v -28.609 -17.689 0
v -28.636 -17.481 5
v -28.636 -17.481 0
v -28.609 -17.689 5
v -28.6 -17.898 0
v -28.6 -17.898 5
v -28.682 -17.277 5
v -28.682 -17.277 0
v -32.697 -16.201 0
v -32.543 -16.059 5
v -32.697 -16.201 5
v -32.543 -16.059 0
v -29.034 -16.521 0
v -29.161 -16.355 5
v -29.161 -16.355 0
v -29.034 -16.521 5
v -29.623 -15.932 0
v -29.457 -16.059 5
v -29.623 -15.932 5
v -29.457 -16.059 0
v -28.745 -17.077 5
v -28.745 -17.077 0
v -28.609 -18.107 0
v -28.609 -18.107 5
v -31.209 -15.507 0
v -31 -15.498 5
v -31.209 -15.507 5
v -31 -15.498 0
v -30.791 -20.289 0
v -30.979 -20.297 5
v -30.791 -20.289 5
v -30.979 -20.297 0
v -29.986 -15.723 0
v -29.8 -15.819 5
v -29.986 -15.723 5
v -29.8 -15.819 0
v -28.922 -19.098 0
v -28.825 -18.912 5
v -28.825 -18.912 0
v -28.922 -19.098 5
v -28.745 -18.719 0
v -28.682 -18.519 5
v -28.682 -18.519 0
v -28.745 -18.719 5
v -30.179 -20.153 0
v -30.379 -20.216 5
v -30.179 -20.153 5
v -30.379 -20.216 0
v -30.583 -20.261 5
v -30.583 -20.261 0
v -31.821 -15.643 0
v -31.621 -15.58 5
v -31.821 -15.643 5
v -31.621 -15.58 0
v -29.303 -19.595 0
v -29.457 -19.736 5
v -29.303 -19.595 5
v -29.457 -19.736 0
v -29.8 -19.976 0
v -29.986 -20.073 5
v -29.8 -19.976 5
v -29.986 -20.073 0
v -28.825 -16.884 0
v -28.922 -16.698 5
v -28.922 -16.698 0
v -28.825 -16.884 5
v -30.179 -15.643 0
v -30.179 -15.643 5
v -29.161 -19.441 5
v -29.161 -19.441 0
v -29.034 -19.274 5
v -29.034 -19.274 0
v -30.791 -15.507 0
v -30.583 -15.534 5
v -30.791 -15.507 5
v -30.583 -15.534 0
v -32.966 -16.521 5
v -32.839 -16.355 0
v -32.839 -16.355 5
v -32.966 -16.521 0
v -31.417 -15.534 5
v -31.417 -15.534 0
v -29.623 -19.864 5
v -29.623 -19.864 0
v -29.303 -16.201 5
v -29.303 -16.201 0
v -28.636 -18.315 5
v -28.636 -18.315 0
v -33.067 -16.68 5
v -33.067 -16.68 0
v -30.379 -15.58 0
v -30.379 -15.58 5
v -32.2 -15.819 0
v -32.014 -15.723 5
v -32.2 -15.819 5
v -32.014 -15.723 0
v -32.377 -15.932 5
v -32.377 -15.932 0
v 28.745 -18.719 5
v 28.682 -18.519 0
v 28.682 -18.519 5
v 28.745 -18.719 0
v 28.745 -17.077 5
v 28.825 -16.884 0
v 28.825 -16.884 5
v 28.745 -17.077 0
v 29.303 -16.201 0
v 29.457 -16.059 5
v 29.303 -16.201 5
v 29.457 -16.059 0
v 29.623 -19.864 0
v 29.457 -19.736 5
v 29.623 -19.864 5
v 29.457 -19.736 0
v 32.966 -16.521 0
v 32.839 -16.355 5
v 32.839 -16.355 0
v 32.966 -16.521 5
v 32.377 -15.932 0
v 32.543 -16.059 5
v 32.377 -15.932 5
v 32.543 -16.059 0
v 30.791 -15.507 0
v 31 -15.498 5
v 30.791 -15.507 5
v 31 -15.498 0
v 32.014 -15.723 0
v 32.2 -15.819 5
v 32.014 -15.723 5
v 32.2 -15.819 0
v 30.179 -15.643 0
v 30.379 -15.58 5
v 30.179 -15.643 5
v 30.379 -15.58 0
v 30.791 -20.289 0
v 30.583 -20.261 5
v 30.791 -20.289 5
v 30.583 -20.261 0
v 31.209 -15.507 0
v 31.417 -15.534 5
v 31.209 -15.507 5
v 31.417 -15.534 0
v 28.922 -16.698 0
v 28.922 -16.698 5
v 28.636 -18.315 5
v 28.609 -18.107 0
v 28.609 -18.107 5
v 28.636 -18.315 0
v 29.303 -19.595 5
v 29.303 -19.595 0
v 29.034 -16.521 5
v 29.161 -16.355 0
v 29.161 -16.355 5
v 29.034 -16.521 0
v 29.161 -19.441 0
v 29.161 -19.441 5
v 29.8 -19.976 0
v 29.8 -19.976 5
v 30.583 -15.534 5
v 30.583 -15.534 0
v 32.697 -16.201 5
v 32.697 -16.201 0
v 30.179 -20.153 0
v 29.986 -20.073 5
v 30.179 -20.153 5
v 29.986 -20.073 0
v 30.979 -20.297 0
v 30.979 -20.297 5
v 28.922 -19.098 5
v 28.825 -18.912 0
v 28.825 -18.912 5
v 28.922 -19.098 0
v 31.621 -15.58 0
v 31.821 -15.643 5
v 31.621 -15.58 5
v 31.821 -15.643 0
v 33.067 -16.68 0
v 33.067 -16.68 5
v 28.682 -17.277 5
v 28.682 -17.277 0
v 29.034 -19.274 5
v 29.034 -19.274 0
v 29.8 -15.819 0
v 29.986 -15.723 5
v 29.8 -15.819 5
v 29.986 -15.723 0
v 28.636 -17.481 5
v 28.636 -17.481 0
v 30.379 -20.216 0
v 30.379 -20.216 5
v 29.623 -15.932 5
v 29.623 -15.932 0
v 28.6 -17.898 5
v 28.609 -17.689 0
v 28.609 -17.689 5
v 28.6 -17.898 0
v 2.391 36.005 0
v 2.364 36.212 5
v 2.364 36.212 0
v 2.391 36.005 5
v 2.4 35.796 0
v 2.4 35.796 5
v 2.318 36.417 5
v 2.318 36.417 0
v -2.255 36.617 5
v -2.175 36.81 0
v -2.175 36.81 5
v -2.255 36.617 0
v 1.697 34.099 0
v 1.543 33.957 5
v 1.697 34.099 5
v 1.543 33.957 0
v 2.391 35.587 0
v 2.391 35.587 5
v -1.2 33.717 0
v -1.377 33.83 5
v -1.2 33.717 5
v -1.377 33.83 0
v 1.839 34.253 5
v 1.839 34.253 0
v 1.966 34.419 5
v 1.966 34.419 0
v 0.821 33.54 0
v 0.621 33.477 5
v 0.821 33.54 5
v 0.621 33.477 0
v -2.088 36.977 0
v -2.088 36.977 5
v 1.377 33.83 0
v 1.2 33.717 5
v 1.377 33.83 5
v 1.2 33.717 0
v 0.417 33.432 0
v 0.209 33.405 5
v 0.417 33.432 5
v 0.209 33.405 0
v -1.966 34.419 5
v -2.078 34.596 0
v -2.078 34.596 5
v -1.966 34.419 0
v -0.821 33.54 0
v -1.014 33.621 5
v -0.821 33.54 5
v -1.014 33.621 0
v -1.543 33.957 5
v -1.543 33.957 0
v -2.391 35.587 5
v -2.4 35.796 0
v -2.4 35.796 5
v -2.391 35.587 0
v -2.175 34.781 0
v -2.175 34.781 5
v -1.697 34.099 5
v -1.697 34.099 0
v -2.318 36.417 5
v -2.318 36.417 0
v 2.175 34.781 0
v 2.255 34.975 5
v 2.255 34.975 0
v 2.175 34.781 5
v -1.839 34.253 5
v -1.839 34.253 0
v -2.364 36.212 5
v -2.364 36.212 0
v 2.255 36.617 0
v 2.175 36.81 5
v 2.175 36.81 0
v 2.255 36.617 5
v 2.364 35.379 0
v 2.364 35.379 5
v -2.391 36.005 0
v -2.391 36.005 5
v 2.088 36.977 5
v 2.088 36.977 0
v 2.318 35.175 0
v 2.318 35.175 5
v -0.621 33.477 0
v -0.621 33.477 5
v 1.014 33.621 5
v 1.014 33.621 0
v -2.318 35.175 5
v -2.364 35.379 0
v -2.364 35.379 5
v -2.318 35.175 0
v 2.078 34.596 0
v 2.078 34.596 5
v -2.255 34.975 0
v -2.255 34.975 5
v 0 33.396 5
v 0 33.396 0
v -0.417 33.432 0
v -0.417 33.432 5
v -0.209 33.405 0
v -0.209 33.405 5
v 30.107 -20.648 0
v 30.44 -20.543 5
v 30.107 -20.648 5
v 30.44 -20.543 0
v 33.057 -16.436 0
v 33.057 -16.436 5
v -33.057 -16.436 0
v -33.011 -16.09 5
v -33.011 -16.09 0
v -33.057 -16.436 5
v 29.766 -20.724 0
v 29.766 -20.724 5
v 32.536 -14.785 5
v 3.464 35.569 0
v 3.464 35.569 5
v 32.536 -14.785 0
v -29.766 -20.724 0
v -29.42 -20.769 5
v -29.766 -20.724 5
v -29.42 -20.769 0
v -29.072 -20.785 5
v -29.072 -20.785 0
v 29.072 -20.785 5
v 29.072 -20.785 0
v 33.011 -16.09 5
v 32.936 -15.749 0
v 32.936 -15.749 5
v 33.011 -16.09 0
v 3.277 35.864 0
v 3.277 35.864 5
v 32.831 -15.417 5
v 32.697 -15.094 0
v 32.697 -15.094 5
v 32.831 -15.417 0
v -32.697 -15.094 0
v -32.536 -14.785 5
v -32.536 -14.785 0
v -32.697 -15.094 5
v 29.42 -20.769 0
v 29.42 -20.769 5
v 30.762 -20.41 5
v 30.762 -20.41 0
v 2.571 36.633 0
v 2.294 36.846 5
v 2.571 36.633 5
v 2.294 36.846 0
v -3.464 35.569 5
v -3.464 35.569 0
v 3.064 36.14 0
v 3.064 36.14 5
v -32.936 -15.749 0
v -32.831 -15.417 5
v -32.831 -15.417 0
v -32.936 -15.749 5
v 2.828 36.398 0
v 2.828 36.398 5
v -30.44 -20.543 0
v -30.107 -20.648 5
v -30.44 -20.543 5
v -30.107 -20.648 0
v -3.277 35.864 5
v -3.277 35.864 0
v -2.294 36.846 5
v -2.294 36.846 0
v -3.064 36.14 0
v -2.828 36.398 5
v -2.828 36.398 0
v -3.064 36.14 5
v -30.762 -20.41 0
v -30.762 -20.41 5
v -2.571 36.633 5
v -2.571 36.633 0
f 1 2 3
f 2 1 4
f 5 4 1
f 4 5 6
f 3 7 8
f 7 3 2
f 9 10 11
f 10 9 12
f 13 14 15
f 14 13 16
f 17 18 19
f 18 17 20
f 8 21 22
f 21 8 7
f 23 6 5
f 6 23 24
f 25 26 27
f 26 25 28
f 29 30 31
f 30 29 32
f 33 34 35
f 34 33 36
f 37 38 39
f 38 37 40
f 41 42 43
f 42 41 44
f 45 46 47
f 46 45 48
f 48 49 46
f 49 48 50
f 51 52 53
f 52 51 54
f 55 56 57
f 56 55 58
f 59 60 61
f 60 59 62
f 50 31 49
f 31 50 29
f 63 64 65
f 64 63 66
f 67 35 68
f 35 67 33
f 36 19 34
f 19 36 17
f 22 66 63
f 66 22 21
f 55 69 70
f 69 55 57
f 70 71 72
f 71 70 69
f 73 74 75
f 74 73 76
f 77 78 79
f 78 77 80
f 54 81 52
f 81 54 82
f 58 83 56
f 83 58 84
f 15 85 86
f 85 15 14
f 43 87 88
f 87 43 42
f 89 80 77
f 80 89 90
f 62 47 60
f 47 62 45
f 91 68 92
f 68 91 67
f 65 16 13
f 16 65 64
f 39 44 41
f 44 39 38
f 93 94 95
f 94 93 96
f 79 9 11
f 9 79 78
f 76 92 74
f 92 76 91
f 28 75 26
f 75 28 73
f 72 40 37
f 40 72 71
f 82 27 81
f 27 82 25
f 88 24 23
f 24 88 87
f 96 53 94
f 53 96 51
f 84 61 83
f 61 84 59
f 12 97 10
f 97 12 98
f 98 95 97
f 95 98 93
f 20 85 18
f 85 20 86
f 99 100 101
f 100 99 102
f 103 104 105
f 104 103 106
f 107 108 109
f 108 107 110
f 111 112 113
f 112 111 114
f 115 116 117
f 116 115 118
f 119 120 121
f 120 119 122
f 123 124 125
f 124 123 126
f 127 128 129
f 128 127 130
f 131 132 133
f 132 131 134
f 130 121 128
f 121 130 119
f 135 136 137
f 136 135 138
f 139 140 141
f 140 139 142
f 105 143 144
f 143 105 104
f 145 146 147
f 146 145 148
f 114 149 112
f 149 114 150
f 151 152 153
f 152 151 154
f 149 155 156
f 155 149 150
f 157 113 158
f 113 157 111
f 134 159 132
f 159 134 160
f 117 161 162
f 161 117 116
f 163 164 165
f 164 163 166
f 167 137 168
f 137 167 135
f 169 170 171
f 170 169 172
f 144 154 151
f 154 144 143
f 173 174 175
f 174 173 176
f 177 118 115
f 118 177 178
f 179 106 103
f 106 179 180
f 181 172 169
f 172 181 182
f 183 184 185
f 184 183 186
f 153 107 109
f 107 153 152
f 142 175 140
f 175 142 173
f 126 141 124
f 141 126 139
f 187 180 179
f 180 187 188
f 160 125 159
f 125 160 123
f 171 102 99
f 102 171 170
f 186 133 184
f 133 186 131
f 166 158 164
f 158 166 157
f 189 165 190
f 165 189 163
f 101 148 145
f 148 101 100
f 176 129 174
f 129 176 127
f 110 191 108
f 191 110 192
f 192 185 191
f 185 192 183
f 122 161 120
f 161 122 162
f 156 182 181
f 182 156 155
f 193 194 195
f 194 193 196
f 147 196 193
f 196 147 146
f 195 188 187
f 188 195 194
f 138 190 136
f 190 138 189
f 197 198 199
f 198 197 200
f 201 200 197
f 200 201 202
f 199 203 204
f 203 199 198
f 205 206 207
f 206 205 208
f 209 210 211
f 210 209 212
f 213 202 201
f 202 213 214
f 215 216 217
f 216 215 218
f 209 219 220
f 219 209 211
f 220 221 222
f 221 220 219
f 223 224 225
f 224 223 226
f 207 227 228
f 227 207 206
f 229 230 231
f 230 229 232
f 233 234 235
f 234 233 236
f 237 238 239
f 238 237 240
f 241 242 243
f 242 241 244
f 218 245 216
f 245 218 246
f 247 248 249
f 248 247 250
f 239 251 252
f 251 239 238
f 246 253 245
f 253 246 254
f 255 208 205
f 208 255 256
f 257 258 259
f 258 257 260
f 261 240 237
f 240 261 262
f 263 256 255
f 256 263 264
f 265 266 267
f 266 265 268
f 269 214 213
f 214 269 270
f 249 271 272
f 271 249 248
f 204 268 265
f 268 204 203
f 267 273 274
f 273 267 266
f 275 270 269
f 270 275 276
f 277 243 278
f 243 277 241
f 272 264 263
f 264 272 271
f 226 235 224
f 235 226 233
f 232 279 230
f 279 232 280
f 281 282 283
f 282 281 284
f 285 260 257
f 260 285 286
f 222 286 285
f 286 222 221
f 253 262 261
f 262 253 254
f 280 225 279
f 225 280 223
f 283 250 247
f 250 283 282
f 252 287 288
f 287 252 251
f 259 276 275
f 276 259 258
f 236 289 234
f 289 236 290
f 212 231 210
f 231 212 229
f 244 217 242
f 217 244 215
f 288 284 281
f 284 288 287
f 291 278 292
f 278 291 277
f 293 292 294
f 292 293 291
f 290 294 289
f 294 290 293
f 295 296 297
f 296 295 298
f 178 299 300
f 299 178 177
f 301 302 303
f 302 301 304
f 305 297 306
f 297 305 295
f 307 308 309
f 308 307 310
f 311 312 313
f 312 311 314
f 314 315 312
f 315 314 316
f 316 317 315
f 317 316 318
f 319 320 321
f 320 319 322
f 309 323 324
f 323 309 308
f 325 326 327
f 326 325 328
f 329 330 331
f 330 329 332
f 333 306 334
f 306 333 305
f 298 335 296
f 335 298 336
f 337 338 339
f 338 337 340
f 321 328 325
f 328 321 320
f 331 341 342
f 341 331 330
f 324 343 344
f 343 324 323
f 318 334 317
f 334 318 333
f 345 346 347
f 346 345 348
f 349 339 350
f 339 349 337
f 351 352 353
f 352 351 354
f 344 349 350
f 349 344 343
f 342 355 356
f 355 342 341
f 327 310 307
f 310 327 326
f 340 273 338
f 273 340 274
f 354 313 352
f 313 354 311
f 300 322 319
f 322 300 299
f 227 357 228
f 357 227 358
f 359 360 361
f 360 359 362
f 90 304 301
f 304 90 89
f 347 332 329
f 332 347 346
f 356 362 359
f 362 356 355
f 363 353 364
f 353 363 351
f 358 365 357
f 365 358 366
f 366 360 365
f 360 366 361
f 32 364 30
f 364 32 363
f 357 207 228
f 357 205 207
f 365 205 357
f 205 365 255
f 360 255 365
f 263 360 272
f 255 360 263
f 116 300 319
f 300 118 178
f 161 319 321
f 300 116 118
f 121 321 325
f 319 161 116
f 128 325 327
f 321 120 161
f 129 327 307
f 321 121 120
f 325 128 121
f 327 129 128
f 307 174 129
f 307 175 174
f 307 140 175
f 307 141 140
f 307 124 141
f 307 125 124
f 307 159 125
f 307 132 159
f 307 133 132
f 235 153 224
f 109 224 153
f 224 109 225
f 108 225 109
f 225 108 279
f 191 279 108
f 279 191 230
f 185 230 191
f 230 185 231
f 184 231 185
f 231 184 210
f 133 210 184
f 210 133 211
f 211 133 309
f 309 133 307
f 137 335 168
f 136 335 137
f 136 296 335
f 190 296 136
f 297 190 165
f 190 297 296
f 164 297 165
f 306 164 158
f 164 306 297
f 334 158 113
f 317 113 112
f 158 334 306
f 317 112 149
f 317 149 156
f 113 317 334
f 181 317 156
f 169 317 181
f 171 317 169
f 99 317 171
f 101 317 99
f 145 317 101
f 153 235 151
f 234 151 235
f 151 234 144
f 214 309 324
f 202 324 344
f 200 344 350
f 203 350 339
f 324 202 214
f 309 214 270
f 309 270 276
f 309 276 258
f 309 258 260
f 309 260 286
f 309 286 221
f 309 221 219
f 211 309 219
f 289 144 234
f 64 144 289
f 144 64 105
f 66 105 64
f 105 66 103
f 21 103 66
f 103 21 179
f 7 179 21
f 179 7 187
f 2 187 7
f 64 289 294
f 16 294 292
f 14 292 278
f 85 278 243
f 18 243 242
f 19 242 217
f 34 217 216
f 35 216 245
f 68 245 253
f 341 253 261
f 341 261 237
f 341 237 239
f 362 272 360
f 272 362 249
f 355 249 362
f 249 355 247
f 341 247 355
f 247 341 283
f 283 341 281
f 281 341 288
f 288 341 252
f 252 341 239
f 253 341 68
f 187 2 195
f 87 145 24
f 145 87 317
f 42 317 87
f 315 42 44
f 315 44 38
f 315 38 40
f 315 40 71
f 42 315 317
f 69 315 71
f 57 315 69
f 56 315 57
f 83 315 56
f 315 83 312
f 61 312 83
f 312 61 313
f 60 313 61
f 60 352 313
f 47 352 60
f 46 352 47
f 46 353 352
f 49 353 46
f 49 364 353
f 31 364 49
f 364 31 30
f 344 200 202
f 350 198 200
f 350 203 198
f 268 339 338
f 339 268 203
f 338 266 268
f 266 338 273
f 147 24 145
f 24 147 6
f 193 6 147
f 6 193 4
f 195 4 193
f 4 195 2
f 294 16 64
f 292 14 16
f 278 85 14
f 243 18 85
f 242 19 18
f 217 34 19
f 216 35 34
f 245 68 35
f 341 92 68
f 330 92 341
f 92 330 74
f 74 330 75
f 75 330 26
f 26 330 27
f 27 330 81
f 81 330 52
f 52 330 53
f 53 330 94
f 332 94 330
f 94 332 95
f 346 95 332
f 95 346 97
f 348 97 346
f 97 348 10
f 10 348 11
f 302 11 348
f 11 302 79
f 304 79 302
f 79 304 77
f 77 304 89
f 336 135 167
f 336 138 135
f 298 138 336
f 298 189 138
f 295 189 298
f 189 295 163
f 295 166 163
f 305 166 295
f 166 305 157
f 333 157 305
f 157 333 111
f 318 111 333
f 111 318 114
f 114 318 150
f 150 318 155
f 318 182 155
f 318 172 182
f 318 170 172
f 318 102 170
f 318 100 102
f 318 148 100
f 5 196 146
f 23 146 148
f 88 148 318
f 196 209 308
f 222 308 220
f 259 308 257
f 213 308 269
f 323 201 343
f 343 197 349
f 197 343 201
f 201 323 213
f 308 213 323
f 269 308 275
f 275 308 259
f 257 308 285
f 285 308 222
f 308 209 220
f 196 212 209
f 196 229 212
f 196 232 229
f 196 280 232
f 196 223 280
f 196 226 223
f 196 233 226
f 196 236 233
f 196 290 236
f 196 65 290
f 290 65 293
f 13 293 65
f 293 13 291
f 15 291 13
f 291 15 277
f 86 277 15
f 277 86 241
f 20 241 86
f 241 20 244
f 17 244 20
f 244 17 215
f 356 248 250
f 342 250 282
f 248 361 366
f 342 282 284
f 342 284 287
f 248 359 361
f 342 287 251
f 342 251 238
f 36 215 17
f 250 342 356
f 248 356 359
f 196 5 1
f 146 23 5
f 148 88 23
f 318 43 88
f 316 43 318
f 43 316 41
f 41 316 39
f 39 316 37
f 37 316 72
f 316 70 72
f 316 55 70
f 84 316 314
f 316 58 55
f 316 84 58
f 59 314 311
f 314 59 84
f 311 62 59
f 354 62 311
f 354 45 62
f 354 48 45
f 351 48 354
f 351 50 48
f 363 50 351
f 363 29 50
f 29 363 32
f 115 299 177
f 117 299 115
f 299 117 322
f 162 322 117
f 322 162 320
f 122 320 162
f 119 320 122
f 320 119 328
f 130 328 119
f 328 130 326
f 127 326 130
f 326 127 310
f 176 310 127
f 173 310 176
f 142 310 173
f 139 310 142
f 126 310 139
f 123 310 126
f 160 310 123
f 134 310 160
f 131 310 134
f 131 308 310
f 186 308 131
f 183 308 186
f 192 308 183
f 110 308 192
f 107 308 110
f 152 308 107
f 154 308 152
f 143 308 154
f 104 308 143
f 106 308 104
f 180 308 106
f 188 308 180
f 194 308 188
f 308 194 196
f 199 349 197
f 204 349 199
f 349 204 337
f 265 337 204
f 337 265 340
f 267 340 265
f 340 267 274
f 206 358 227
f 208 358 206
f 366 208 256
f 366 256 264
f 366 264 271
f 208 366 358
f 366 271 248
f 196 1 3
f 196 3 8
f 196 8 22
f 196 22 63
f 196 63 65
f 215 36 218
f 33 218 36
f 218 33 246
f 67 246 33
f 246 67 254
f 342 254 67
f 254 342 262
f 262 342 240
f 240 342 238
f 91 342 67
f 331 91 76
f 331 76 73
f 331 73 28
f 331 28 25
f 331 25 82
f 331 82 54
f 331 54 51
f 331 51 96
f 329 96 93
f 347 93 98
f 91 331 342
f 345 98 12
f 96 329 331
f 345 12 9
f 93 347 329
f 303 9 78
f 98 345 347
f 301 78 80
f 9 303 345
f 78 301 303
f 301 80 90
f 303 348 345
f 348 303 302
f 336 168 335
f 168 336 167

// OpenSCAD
// Triangle Plate
side_length = 72;
plate_thickness = 5;
corner_radius = 4;
hole_diameter = 4.8;
hole_offset = 10;

$fn = $preview ? 32 : 72;

triangle_height = side_length * sqrt(3) / 2;

function raw_triangle_points() = [
  [-side_length / 2, -triangle_height / 3],
  [side_length / 2, -triangle_height / 3],
  [0, triangle_height * 2 / 3]
];

module triangle_2d() {
  offset(r = corner_radius) {
    offset(delta = -corner_radius) {
      polygon(points = raw_triangle_points());
    }
  }
}

difference() {
  linear_extrude(height = plate_thickness) triangle_2d();

  for (pt = raw_triangle_points()) {
    translate([
      pt[0] * (1 - hole_offset / side_length),
      pt[1] * (1 - hole_offset / side_length),
      -0.1
    ]) cylinder(h = plate_thickness + 0.2, d = hole_diameter);
  }
}
